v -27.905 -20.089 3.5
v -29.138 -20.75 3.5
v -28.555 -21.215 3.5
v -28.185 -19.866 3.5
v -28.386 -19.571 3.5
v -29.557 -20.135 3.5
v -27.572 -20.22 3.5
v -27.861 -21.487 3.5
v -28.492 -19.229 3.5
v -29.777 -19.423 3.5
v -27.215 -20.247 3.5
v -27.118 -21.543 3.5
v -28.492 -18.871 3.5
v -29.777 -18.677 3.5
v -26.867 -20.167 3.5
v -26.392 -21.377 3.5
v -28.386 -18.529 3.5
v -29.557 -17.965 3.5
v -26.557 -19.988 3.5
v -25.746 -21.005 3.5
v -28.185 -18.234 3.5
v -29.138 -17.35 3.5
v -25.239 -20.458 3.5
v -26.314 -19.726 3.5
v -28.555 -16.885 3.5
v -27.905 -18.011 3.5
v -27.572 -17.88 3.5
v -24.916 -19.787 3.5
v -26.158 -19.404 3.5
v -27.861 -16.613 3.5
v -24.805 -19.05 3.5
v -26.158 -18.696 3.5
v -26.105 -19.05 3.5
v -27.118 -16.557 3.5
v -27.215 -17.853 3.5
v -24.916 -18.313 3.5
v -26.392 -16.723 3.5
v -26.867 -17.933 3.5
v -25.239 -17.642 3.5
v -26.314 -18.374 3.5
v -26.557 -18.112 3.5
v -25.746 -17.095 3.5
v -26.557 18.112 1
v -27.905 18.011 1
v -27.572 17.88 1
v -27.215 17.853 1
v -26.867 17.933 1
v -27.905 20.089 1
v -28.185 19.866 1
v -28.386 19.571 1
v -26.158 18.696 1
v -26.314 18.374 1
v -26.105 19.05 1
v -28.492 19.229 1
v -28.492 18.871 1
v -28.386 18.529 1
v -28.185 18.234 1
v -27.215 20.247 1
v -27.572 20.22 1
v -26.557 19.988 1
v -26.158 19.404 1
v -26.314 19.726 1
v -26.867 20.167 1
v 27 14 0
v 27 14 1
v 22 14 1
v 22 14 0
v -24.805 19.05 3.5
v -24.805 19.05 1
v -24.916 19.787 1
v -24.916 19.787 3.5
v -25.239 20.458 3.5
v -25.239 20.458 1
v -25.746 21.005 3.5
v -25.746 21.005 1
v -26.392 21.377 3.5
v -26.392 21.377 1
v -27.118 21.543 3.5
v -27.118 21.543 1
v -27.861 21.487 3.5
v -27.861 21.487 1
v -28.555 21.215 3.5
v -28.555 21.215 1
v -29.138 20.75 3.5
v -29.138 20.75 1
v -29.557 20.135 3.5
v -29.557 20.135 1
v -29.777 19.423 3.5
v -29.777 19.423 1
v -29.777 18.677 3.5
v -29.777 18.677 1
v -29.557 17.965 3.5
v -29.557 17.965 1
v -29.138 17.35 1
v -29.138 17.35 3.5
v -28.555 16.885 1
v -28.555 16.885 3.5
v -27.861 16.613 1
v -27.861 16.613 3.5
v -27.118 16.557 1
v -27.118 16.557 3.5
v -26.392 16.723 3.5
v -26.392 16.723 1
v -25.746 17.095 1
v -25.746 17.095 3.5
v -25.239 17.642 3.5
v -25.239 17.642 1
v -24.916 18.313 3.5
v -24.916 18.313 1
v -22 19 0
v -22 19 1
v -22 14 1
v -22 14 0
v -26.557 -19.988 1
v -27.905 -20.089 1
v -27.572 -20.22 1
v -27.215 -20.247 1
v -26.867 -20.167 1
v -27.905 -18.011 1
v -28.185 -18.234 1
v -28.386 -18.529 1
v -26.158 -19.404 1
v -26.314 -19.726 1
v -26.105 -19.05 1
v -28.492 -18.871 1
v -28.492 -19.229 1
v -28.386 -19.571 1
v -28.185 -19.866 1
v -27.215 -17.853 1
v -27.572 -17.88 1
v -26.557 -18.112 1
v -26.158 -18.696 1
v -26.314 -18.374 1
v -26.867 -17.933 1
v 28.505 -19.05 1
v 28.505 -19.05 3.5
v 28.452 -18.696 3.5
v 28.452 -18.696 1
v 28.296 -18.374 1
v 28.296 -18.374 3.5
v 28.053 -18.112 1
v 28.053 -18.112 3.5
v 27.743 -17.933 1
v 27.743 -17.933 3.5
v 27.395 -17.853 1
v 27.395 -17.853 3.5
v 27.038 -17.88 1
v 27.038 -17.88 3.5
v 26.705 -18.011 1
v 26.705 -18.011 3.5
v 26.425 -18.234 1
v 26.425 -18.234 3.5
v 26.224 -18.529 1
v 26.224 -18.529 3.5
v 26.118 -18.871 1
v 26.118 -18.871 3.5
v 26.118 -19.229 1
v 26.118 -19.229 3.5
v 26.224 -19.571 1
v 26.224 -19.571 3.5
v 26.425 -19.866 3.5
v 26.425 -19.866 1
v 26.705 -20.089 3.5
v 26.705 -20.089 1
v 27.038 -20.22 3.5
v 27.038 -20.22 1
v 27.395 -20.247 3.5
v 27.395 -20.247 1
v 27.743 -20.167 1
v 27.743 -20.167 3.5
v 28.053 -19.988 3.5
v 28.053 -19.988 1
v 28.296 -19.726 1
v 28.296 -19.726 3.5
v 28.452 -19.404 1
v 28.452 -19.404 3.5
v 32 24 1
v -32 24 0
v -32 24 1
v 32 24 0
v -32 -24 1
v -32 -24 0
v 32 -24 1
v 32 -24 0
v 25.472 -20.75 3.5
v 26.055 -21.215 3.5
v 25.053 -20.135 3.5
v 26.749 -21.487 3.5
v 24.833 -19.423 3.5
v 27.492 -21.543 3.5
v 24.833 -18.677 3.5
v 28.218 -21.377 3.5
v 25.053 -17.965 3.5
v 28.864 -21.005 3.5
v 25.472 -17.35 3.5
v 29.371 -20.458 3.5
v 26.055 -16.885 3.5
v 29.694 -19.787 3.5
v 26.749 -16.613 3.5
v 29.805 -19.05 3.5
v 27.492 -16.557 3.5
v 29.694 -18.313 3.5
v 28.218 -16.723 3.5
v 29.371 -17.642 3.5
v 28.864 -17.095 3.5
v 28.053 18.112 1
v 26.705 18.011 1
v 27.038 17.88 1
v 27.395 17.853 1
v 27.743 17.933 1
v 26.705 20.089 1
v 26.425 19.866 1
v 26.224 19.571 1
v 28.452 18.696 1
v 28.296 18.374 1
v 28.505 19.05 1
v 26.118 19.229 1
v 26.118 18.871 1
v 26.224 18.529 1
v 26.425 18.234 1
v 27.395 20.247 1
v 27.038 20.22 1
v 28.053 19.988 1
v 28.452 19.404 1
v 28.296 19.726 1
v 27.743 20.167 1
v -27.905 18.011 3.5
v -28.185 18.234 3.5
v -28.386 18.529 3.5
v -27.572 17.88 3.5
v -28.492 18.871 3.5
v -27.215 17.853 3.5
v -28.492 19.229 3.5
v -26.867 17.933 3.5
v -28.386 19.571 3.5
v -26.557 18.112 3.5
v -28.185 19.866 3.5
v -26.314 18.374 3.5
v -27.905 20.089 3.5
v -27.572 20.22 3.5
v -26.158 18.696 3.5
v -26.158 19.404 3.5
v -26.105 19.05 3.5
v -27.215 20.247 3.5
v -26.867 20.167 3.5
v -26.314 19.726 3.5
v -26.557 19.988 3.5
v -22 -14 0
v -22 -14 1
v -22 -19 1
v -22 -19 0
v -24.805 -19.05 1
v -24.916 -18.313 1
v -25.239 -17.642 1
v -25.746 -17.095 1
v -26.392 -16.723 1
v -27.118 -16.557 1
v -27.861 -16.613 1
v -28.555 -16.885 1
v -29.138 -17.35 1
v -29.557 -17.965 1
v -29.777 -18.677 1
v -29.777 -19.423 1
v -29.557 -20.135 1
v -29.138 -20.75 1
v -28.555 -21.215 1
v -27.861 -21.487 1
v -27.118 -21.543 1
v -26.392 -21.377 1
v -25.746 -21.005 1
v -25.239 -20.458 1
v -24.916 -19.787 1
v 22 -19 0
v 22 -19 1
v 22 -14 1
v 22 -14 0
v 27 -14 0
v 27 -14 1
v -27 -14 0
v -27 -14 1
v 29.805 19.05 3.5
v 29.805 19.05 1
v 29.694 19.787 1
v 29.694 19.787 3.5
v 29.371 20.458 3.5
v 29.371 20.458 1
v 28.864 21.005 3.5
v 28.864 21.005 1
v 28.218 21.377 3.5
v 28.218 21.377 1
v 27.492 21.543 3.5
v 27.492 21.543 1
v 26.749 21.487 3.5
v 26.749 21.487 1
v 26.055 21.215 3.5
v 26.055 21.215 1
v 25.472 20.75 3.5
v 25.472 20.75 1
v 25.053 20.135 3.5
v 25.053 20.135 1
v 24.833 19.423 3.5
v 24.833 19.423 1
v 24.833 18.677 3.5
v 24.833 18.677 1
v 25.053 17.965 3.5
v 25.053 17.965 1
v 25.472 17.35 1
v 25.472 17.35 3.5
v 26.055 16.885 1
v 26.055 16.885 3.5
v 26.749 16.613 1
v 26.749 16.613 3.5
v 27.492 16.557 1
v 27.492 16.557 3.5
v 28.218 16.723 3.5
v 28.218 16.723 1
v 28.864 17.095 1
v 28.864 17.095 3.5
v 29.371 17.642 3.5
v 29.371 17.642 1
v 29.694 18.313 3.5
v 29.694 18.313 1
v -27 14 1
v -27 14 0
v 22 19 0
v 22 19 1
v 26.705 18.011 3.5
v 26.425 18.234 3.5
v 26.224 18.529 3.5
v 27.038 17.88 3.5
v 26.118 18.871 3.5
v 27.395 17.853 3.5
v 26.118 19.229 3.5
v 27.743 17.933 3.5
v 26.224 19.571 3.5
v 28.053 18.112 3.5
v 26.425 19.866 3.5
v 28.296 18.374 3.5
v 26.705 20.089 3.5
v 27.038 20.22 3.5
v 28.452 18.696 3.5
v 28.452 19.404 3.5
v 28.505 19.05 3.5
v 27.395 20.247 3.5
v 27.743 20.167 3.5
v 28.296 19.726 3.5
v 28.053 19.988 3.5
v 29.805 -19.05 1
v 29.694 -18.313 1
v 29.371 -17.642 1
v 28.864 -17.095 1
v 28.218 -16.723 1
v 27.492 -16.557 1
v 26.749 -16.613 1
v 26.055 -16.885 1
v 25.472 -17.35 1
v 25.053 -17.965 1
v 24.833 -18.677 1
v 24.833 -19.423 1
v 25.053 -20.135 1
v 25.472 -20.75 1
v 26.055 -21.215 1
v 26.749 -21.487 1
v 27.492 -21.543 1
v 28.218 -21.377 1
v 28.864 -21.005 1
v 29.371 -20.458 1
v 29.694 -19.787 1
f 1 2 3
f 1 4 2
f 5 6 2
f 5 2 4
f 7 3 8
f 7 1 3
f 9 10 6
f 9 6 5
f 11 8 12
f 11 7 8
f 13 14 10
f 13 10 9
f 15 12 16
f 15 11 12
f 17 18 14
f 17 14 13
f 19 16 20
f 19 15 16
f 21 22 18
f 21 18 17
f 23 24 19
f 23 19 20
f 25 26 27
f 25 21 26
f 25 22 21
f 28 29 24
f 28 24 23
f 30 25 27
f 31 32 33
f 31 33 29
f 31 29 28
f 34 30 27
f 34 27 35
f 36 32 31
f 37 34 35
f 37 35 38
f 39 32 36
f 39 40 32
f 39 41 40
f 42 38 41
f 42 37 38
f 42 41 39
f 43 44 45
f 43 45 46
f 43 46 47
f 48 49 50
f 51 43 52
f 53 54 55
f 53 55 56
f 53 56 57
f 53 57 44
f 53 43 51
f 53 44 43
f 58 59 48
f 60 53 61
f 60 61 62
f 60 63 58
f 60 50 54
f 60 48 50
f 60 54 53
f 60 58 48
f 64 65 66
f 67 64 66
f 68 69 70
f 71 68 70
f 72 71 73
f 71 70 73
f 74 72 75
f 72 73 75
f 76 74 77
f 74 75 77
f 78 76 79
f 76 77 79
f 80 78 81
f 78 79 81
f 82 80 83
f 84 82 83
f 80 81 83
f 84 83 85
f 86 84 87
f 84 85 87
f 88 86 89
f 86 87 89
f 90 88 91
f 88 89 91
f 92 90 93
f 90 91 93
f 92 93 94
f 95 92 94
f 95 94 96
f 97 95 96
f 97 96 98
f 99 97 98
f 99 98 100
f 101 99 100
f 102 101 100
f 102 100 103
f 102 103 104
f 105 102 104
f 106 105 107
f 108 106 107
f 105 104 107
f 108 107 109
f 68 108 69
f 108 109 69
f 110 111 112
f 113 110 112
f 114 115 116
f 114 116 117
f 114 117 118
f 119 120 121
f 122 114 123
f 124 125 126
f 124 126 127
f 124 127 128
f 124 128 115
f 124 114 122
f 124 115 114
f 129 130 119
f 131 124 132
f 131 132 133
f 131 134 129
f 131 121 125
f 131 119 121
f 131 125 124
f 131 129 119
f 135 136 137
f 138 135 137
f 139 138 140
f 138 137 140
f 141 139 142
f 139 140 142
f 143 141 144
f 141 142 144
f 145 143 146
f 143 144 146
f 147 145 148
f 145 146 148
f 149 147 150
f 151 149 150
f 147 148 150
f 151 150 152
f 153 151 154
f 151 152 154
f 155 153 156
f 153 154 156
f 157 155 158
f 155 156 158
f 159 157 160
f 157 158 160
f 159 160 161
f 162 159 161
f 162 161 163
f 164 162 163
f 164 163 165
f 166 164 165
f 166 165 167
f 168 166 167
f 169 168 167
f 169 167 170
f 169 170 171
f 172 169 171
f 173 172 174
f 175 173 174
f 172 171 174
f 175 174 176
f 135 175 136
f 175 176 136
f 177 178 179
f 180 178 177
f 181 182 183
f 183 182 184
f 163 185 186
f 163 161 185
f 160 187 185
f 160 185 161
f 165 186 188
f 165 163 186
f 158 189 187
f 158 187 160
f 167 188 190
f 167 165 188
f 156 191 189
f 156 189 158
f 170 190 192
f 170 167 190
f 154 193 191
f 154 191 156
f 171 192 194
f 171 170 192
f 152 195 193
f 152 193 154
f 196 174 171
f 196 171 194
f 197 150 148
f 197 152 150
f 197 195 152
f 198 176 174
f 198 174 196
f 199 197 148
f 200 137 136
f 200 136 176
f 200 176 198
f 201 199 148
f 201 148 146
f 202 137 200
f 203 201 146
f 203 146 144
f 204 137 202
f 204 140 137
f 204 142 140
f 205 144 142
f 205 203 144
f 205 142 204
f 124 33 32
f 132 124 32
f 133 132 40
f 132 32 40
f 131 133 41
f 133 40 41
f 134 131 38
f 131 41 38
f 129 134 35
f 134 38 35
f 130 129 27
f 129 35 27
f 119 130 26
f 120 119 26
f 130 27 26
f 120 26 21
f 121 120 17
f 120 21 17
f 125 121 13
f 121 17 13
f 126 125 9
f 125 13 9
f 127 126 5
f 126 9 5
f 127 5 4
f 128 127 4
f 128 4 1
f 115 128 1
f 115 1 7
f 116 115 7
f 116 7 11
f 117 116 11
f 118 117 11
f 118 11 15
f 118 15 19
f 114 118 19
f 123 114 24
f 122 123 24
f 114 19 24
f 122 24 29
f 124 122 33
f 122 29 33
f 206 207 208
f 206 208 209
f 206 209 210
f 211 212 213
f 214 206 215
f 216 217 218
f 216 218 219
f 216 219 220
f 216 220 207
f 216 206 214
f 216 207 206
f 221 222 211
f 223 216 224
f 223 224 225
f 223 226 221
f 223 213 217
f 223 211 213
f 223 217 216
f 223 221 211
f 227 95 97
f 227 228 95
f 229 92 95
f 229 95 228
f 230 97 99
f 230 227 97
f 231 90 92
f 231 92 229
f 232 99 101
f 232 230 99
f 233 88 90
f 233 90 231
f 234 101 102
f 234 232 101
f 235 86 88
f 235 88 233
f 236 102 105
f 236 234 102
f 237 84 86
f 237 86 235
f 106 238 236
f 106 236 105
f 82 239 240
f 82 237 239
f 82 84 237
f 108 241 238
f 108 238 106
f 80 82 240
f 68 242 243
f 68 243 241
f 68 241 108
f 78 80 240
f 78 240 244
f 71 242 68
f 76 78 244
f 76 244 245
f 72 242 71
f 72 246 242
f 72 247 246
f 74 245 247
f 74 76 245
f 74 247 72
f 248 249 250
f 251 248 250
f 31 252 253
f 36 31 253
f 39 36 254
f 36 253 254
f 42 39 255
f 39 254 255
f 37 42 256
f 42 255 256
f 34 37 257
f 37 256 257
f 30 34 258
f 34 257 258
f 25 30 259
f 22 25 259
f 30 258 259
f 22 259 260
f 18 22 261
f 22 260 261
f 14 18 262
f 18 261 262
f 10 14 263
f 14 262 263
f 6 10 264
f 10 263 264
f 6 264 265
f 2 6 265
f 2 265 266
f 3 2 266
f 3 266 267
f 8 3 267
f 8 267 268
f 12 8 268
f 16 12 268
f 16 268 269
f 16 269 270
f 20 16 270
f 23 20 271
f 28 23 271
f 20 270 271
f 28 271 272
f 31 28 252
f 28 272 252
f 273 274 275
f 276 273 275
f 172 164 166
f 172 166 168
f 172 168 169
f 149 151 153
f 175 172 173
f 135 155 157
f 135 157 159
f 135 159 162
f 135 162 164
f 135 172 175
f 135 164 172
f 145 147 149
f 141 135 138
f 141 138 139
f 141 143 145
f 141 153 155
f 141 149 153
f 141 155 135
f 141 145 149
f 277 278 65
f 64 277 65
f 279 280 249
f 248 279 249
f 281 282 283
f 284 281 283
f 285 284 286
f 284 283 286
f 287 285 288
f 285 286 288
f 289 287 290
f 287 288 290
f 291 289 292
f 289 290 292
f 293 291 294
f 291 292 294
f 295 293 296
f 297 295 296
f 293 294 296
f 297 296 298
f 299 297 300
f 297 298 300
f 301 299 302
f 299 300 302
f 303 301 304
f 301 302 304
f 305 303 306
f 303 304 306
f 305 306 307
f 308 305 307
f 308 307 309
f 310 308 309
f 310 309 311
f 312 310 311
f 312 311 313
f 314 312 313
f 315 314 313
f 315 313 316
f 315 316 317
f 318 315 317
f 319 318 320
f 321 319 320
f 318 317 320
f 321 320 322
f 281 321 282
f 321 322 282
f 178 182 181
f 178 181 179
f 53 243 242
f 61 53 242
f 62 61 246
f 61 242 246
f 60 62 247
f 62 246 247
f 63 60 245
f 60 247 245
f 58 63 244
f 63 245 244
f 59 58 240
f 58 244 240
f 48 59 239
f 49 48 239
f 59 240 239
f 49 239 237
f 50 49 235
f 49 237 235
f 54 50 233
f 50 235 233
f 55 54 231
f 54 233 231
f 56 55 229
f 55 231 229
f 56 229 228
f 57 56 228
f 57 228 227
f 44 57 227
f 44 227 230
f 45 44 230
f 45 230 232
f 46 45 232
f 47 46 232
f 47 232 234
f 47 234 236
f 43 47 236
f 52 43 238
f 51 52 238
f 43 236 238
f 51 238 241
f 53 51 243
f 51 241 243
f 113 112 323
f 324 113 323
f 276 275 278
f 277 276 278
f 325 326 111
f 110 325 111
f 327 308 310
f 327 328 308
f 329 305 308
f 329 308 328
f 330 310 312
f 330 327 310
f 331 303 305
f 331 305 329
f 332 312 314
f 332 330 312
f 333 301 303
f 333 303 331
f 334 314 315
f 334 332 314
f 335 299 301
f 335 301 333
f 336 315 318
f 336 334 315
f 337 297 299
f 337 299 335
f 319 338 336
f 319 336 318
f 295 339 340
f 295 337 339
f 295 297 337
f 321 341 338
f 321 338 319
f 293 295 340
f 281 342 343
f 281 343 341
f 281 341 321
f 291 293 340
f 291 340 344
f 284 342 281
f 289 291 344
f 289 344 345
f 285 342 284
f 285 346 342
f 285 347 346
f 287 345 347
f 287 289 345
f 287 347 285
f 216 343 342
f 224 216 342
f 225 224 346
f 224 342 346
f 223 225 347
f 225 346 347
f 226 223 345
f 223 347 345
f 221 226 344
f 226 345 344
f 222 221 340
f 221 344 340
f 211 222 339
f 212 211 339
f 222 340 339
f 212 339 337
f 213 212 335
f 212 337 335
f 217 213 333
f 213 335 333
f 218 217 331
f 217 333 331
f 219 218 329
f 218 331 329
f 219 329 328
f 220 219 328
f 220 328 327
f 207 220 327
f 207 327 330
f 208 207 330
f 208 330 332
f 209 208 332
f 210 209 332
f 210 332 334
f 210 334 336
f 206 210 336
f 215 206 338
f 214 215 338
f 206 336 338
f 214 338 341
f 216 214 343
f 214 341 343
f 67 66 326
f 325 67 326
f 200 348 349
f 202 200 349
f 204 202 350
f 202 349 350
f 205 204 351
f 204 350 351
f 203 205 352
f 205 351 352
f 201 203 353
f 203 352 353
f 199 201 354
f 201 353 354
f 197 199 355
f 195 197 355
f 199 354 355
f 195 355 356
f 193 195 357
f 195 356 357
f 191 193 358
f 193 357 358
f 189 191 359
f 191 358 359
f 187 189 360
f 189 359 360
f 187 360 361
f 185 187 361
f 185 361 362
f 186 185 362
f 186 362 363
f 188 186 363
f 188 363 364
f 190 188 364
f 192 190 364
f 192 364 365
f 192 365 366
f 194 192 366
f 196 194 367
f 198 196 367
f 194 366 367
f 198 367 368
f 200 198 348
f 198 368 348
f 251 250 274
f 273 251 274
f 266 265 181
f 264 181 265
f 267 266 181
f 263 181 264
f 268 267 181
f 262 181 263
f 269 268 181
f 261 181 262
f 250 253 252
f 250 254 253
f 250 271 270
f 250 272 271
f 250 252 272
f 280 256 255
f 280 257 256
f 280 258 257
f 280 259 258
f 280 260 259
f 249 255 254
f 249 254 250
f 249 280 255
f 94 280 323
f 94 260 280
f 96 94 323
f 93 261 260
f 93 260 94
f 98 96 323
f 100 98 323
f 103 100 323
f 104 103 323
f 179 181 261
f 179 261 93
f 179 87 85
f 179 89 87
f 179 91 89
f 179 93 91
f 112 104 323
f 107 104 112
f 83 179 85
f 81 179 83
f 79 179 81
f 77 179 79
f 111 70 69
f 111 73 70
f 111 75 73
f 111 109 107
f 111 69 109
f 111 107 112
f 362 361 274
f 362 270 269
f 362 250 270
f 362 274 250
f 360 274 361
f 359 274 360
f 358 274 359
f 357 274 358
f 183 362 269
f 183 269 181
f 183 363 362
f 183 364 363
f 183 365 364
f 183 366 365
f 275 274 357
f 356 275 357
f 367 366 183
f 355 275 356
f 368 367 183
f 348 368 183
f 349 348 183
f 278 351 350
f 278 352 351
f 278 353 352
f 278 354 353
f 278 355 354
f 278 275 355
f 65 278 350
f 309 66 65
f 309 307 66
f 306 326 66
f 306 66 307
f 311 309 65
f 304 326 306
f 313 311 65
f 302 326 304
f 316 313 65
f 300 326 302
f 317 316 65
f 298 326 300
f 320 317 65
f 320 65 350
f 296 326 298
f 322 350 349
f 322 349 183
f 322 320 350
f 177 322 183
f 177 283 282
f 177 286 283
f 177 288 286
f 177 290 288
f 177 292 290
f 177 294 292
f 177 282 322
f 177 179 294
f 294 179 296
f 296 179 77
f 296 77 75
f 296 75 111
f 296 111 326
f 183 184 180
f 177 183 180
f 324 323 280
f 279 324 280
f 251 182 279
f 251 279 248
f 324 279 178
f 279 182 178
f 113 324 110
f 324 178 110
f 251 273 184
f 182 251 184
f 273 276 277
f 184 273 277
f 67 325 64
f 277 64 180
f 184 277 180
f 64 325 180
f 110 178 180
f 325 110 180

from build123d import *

# Parameters (mm, degrees)
SKETCH_W        = 64
SKETCH_H        = 48
PAD_DEPTH       = 1
POCKET_DEPTH    = 1.001
SKETCH002_R     = 2.5
PAD001_DEPTH    = 2.5
SKETCH003_R     = 1.2
POCKET001_DEPTH = 2.5


with BuildPart() as part:
    # Sketch → Pad (new body)
    with BuildSketch(Plane.XY):
        Rectangle(SKETCH_W, SKETCH_H)
    extrude(amount=PAD_DEPTH)

    # Sketch001 → Pocket (cut, through all)
    with BuildSketch(Plane.XY.offset(1)):
        Polygon((-27, 14), (-27, -14), (-22, -14), (-22, -19), (22, -19), (22, -14), (27, -14), (27, 14), (22, 14), (22, 19), (-22, 19), (-22, 14), align=None)
    extrude(amount=-POCKET_DEPTH, mode=Mode.SUBTRACT)

    # Sketch002 → Pad001 (new body)
    with BuildSketch(Plane.XY.offset(1)):
        with Locations((-27.305, 19.05)):
            Circle(SKETCH002_R)
        with Locations((-27.305, -19.05)):
            Circle(SKETCH002_R)
        with Locations((27.305, 19.05)):
            Circle(SKETCH002_R)
        with Locations((27.305, -19.05)):
            Circle(SKETCH002_R)
    extrude(amount=PAD001_DEPTH)

    # Sketch003 → Pocket001 (cut)
    with BuildSketch(Plane.XY.offset(3.5)):
        with Locations((27.305, 19.05)):
            Circle(SKETCH003_R)
        with Locations((-27.305, -19.05)):
            Circle(SKETCH003_R)
        with Locations((27.305, -19.05)):
            Circle(SKETCH003_R)
        with Locations((-27.305, 19.05)):
            Circle(SKETCH003_R)
    extrude(amount=-POCKET001_DEPTH, mode=Mode.SUBTRACT)


solid = part.part
